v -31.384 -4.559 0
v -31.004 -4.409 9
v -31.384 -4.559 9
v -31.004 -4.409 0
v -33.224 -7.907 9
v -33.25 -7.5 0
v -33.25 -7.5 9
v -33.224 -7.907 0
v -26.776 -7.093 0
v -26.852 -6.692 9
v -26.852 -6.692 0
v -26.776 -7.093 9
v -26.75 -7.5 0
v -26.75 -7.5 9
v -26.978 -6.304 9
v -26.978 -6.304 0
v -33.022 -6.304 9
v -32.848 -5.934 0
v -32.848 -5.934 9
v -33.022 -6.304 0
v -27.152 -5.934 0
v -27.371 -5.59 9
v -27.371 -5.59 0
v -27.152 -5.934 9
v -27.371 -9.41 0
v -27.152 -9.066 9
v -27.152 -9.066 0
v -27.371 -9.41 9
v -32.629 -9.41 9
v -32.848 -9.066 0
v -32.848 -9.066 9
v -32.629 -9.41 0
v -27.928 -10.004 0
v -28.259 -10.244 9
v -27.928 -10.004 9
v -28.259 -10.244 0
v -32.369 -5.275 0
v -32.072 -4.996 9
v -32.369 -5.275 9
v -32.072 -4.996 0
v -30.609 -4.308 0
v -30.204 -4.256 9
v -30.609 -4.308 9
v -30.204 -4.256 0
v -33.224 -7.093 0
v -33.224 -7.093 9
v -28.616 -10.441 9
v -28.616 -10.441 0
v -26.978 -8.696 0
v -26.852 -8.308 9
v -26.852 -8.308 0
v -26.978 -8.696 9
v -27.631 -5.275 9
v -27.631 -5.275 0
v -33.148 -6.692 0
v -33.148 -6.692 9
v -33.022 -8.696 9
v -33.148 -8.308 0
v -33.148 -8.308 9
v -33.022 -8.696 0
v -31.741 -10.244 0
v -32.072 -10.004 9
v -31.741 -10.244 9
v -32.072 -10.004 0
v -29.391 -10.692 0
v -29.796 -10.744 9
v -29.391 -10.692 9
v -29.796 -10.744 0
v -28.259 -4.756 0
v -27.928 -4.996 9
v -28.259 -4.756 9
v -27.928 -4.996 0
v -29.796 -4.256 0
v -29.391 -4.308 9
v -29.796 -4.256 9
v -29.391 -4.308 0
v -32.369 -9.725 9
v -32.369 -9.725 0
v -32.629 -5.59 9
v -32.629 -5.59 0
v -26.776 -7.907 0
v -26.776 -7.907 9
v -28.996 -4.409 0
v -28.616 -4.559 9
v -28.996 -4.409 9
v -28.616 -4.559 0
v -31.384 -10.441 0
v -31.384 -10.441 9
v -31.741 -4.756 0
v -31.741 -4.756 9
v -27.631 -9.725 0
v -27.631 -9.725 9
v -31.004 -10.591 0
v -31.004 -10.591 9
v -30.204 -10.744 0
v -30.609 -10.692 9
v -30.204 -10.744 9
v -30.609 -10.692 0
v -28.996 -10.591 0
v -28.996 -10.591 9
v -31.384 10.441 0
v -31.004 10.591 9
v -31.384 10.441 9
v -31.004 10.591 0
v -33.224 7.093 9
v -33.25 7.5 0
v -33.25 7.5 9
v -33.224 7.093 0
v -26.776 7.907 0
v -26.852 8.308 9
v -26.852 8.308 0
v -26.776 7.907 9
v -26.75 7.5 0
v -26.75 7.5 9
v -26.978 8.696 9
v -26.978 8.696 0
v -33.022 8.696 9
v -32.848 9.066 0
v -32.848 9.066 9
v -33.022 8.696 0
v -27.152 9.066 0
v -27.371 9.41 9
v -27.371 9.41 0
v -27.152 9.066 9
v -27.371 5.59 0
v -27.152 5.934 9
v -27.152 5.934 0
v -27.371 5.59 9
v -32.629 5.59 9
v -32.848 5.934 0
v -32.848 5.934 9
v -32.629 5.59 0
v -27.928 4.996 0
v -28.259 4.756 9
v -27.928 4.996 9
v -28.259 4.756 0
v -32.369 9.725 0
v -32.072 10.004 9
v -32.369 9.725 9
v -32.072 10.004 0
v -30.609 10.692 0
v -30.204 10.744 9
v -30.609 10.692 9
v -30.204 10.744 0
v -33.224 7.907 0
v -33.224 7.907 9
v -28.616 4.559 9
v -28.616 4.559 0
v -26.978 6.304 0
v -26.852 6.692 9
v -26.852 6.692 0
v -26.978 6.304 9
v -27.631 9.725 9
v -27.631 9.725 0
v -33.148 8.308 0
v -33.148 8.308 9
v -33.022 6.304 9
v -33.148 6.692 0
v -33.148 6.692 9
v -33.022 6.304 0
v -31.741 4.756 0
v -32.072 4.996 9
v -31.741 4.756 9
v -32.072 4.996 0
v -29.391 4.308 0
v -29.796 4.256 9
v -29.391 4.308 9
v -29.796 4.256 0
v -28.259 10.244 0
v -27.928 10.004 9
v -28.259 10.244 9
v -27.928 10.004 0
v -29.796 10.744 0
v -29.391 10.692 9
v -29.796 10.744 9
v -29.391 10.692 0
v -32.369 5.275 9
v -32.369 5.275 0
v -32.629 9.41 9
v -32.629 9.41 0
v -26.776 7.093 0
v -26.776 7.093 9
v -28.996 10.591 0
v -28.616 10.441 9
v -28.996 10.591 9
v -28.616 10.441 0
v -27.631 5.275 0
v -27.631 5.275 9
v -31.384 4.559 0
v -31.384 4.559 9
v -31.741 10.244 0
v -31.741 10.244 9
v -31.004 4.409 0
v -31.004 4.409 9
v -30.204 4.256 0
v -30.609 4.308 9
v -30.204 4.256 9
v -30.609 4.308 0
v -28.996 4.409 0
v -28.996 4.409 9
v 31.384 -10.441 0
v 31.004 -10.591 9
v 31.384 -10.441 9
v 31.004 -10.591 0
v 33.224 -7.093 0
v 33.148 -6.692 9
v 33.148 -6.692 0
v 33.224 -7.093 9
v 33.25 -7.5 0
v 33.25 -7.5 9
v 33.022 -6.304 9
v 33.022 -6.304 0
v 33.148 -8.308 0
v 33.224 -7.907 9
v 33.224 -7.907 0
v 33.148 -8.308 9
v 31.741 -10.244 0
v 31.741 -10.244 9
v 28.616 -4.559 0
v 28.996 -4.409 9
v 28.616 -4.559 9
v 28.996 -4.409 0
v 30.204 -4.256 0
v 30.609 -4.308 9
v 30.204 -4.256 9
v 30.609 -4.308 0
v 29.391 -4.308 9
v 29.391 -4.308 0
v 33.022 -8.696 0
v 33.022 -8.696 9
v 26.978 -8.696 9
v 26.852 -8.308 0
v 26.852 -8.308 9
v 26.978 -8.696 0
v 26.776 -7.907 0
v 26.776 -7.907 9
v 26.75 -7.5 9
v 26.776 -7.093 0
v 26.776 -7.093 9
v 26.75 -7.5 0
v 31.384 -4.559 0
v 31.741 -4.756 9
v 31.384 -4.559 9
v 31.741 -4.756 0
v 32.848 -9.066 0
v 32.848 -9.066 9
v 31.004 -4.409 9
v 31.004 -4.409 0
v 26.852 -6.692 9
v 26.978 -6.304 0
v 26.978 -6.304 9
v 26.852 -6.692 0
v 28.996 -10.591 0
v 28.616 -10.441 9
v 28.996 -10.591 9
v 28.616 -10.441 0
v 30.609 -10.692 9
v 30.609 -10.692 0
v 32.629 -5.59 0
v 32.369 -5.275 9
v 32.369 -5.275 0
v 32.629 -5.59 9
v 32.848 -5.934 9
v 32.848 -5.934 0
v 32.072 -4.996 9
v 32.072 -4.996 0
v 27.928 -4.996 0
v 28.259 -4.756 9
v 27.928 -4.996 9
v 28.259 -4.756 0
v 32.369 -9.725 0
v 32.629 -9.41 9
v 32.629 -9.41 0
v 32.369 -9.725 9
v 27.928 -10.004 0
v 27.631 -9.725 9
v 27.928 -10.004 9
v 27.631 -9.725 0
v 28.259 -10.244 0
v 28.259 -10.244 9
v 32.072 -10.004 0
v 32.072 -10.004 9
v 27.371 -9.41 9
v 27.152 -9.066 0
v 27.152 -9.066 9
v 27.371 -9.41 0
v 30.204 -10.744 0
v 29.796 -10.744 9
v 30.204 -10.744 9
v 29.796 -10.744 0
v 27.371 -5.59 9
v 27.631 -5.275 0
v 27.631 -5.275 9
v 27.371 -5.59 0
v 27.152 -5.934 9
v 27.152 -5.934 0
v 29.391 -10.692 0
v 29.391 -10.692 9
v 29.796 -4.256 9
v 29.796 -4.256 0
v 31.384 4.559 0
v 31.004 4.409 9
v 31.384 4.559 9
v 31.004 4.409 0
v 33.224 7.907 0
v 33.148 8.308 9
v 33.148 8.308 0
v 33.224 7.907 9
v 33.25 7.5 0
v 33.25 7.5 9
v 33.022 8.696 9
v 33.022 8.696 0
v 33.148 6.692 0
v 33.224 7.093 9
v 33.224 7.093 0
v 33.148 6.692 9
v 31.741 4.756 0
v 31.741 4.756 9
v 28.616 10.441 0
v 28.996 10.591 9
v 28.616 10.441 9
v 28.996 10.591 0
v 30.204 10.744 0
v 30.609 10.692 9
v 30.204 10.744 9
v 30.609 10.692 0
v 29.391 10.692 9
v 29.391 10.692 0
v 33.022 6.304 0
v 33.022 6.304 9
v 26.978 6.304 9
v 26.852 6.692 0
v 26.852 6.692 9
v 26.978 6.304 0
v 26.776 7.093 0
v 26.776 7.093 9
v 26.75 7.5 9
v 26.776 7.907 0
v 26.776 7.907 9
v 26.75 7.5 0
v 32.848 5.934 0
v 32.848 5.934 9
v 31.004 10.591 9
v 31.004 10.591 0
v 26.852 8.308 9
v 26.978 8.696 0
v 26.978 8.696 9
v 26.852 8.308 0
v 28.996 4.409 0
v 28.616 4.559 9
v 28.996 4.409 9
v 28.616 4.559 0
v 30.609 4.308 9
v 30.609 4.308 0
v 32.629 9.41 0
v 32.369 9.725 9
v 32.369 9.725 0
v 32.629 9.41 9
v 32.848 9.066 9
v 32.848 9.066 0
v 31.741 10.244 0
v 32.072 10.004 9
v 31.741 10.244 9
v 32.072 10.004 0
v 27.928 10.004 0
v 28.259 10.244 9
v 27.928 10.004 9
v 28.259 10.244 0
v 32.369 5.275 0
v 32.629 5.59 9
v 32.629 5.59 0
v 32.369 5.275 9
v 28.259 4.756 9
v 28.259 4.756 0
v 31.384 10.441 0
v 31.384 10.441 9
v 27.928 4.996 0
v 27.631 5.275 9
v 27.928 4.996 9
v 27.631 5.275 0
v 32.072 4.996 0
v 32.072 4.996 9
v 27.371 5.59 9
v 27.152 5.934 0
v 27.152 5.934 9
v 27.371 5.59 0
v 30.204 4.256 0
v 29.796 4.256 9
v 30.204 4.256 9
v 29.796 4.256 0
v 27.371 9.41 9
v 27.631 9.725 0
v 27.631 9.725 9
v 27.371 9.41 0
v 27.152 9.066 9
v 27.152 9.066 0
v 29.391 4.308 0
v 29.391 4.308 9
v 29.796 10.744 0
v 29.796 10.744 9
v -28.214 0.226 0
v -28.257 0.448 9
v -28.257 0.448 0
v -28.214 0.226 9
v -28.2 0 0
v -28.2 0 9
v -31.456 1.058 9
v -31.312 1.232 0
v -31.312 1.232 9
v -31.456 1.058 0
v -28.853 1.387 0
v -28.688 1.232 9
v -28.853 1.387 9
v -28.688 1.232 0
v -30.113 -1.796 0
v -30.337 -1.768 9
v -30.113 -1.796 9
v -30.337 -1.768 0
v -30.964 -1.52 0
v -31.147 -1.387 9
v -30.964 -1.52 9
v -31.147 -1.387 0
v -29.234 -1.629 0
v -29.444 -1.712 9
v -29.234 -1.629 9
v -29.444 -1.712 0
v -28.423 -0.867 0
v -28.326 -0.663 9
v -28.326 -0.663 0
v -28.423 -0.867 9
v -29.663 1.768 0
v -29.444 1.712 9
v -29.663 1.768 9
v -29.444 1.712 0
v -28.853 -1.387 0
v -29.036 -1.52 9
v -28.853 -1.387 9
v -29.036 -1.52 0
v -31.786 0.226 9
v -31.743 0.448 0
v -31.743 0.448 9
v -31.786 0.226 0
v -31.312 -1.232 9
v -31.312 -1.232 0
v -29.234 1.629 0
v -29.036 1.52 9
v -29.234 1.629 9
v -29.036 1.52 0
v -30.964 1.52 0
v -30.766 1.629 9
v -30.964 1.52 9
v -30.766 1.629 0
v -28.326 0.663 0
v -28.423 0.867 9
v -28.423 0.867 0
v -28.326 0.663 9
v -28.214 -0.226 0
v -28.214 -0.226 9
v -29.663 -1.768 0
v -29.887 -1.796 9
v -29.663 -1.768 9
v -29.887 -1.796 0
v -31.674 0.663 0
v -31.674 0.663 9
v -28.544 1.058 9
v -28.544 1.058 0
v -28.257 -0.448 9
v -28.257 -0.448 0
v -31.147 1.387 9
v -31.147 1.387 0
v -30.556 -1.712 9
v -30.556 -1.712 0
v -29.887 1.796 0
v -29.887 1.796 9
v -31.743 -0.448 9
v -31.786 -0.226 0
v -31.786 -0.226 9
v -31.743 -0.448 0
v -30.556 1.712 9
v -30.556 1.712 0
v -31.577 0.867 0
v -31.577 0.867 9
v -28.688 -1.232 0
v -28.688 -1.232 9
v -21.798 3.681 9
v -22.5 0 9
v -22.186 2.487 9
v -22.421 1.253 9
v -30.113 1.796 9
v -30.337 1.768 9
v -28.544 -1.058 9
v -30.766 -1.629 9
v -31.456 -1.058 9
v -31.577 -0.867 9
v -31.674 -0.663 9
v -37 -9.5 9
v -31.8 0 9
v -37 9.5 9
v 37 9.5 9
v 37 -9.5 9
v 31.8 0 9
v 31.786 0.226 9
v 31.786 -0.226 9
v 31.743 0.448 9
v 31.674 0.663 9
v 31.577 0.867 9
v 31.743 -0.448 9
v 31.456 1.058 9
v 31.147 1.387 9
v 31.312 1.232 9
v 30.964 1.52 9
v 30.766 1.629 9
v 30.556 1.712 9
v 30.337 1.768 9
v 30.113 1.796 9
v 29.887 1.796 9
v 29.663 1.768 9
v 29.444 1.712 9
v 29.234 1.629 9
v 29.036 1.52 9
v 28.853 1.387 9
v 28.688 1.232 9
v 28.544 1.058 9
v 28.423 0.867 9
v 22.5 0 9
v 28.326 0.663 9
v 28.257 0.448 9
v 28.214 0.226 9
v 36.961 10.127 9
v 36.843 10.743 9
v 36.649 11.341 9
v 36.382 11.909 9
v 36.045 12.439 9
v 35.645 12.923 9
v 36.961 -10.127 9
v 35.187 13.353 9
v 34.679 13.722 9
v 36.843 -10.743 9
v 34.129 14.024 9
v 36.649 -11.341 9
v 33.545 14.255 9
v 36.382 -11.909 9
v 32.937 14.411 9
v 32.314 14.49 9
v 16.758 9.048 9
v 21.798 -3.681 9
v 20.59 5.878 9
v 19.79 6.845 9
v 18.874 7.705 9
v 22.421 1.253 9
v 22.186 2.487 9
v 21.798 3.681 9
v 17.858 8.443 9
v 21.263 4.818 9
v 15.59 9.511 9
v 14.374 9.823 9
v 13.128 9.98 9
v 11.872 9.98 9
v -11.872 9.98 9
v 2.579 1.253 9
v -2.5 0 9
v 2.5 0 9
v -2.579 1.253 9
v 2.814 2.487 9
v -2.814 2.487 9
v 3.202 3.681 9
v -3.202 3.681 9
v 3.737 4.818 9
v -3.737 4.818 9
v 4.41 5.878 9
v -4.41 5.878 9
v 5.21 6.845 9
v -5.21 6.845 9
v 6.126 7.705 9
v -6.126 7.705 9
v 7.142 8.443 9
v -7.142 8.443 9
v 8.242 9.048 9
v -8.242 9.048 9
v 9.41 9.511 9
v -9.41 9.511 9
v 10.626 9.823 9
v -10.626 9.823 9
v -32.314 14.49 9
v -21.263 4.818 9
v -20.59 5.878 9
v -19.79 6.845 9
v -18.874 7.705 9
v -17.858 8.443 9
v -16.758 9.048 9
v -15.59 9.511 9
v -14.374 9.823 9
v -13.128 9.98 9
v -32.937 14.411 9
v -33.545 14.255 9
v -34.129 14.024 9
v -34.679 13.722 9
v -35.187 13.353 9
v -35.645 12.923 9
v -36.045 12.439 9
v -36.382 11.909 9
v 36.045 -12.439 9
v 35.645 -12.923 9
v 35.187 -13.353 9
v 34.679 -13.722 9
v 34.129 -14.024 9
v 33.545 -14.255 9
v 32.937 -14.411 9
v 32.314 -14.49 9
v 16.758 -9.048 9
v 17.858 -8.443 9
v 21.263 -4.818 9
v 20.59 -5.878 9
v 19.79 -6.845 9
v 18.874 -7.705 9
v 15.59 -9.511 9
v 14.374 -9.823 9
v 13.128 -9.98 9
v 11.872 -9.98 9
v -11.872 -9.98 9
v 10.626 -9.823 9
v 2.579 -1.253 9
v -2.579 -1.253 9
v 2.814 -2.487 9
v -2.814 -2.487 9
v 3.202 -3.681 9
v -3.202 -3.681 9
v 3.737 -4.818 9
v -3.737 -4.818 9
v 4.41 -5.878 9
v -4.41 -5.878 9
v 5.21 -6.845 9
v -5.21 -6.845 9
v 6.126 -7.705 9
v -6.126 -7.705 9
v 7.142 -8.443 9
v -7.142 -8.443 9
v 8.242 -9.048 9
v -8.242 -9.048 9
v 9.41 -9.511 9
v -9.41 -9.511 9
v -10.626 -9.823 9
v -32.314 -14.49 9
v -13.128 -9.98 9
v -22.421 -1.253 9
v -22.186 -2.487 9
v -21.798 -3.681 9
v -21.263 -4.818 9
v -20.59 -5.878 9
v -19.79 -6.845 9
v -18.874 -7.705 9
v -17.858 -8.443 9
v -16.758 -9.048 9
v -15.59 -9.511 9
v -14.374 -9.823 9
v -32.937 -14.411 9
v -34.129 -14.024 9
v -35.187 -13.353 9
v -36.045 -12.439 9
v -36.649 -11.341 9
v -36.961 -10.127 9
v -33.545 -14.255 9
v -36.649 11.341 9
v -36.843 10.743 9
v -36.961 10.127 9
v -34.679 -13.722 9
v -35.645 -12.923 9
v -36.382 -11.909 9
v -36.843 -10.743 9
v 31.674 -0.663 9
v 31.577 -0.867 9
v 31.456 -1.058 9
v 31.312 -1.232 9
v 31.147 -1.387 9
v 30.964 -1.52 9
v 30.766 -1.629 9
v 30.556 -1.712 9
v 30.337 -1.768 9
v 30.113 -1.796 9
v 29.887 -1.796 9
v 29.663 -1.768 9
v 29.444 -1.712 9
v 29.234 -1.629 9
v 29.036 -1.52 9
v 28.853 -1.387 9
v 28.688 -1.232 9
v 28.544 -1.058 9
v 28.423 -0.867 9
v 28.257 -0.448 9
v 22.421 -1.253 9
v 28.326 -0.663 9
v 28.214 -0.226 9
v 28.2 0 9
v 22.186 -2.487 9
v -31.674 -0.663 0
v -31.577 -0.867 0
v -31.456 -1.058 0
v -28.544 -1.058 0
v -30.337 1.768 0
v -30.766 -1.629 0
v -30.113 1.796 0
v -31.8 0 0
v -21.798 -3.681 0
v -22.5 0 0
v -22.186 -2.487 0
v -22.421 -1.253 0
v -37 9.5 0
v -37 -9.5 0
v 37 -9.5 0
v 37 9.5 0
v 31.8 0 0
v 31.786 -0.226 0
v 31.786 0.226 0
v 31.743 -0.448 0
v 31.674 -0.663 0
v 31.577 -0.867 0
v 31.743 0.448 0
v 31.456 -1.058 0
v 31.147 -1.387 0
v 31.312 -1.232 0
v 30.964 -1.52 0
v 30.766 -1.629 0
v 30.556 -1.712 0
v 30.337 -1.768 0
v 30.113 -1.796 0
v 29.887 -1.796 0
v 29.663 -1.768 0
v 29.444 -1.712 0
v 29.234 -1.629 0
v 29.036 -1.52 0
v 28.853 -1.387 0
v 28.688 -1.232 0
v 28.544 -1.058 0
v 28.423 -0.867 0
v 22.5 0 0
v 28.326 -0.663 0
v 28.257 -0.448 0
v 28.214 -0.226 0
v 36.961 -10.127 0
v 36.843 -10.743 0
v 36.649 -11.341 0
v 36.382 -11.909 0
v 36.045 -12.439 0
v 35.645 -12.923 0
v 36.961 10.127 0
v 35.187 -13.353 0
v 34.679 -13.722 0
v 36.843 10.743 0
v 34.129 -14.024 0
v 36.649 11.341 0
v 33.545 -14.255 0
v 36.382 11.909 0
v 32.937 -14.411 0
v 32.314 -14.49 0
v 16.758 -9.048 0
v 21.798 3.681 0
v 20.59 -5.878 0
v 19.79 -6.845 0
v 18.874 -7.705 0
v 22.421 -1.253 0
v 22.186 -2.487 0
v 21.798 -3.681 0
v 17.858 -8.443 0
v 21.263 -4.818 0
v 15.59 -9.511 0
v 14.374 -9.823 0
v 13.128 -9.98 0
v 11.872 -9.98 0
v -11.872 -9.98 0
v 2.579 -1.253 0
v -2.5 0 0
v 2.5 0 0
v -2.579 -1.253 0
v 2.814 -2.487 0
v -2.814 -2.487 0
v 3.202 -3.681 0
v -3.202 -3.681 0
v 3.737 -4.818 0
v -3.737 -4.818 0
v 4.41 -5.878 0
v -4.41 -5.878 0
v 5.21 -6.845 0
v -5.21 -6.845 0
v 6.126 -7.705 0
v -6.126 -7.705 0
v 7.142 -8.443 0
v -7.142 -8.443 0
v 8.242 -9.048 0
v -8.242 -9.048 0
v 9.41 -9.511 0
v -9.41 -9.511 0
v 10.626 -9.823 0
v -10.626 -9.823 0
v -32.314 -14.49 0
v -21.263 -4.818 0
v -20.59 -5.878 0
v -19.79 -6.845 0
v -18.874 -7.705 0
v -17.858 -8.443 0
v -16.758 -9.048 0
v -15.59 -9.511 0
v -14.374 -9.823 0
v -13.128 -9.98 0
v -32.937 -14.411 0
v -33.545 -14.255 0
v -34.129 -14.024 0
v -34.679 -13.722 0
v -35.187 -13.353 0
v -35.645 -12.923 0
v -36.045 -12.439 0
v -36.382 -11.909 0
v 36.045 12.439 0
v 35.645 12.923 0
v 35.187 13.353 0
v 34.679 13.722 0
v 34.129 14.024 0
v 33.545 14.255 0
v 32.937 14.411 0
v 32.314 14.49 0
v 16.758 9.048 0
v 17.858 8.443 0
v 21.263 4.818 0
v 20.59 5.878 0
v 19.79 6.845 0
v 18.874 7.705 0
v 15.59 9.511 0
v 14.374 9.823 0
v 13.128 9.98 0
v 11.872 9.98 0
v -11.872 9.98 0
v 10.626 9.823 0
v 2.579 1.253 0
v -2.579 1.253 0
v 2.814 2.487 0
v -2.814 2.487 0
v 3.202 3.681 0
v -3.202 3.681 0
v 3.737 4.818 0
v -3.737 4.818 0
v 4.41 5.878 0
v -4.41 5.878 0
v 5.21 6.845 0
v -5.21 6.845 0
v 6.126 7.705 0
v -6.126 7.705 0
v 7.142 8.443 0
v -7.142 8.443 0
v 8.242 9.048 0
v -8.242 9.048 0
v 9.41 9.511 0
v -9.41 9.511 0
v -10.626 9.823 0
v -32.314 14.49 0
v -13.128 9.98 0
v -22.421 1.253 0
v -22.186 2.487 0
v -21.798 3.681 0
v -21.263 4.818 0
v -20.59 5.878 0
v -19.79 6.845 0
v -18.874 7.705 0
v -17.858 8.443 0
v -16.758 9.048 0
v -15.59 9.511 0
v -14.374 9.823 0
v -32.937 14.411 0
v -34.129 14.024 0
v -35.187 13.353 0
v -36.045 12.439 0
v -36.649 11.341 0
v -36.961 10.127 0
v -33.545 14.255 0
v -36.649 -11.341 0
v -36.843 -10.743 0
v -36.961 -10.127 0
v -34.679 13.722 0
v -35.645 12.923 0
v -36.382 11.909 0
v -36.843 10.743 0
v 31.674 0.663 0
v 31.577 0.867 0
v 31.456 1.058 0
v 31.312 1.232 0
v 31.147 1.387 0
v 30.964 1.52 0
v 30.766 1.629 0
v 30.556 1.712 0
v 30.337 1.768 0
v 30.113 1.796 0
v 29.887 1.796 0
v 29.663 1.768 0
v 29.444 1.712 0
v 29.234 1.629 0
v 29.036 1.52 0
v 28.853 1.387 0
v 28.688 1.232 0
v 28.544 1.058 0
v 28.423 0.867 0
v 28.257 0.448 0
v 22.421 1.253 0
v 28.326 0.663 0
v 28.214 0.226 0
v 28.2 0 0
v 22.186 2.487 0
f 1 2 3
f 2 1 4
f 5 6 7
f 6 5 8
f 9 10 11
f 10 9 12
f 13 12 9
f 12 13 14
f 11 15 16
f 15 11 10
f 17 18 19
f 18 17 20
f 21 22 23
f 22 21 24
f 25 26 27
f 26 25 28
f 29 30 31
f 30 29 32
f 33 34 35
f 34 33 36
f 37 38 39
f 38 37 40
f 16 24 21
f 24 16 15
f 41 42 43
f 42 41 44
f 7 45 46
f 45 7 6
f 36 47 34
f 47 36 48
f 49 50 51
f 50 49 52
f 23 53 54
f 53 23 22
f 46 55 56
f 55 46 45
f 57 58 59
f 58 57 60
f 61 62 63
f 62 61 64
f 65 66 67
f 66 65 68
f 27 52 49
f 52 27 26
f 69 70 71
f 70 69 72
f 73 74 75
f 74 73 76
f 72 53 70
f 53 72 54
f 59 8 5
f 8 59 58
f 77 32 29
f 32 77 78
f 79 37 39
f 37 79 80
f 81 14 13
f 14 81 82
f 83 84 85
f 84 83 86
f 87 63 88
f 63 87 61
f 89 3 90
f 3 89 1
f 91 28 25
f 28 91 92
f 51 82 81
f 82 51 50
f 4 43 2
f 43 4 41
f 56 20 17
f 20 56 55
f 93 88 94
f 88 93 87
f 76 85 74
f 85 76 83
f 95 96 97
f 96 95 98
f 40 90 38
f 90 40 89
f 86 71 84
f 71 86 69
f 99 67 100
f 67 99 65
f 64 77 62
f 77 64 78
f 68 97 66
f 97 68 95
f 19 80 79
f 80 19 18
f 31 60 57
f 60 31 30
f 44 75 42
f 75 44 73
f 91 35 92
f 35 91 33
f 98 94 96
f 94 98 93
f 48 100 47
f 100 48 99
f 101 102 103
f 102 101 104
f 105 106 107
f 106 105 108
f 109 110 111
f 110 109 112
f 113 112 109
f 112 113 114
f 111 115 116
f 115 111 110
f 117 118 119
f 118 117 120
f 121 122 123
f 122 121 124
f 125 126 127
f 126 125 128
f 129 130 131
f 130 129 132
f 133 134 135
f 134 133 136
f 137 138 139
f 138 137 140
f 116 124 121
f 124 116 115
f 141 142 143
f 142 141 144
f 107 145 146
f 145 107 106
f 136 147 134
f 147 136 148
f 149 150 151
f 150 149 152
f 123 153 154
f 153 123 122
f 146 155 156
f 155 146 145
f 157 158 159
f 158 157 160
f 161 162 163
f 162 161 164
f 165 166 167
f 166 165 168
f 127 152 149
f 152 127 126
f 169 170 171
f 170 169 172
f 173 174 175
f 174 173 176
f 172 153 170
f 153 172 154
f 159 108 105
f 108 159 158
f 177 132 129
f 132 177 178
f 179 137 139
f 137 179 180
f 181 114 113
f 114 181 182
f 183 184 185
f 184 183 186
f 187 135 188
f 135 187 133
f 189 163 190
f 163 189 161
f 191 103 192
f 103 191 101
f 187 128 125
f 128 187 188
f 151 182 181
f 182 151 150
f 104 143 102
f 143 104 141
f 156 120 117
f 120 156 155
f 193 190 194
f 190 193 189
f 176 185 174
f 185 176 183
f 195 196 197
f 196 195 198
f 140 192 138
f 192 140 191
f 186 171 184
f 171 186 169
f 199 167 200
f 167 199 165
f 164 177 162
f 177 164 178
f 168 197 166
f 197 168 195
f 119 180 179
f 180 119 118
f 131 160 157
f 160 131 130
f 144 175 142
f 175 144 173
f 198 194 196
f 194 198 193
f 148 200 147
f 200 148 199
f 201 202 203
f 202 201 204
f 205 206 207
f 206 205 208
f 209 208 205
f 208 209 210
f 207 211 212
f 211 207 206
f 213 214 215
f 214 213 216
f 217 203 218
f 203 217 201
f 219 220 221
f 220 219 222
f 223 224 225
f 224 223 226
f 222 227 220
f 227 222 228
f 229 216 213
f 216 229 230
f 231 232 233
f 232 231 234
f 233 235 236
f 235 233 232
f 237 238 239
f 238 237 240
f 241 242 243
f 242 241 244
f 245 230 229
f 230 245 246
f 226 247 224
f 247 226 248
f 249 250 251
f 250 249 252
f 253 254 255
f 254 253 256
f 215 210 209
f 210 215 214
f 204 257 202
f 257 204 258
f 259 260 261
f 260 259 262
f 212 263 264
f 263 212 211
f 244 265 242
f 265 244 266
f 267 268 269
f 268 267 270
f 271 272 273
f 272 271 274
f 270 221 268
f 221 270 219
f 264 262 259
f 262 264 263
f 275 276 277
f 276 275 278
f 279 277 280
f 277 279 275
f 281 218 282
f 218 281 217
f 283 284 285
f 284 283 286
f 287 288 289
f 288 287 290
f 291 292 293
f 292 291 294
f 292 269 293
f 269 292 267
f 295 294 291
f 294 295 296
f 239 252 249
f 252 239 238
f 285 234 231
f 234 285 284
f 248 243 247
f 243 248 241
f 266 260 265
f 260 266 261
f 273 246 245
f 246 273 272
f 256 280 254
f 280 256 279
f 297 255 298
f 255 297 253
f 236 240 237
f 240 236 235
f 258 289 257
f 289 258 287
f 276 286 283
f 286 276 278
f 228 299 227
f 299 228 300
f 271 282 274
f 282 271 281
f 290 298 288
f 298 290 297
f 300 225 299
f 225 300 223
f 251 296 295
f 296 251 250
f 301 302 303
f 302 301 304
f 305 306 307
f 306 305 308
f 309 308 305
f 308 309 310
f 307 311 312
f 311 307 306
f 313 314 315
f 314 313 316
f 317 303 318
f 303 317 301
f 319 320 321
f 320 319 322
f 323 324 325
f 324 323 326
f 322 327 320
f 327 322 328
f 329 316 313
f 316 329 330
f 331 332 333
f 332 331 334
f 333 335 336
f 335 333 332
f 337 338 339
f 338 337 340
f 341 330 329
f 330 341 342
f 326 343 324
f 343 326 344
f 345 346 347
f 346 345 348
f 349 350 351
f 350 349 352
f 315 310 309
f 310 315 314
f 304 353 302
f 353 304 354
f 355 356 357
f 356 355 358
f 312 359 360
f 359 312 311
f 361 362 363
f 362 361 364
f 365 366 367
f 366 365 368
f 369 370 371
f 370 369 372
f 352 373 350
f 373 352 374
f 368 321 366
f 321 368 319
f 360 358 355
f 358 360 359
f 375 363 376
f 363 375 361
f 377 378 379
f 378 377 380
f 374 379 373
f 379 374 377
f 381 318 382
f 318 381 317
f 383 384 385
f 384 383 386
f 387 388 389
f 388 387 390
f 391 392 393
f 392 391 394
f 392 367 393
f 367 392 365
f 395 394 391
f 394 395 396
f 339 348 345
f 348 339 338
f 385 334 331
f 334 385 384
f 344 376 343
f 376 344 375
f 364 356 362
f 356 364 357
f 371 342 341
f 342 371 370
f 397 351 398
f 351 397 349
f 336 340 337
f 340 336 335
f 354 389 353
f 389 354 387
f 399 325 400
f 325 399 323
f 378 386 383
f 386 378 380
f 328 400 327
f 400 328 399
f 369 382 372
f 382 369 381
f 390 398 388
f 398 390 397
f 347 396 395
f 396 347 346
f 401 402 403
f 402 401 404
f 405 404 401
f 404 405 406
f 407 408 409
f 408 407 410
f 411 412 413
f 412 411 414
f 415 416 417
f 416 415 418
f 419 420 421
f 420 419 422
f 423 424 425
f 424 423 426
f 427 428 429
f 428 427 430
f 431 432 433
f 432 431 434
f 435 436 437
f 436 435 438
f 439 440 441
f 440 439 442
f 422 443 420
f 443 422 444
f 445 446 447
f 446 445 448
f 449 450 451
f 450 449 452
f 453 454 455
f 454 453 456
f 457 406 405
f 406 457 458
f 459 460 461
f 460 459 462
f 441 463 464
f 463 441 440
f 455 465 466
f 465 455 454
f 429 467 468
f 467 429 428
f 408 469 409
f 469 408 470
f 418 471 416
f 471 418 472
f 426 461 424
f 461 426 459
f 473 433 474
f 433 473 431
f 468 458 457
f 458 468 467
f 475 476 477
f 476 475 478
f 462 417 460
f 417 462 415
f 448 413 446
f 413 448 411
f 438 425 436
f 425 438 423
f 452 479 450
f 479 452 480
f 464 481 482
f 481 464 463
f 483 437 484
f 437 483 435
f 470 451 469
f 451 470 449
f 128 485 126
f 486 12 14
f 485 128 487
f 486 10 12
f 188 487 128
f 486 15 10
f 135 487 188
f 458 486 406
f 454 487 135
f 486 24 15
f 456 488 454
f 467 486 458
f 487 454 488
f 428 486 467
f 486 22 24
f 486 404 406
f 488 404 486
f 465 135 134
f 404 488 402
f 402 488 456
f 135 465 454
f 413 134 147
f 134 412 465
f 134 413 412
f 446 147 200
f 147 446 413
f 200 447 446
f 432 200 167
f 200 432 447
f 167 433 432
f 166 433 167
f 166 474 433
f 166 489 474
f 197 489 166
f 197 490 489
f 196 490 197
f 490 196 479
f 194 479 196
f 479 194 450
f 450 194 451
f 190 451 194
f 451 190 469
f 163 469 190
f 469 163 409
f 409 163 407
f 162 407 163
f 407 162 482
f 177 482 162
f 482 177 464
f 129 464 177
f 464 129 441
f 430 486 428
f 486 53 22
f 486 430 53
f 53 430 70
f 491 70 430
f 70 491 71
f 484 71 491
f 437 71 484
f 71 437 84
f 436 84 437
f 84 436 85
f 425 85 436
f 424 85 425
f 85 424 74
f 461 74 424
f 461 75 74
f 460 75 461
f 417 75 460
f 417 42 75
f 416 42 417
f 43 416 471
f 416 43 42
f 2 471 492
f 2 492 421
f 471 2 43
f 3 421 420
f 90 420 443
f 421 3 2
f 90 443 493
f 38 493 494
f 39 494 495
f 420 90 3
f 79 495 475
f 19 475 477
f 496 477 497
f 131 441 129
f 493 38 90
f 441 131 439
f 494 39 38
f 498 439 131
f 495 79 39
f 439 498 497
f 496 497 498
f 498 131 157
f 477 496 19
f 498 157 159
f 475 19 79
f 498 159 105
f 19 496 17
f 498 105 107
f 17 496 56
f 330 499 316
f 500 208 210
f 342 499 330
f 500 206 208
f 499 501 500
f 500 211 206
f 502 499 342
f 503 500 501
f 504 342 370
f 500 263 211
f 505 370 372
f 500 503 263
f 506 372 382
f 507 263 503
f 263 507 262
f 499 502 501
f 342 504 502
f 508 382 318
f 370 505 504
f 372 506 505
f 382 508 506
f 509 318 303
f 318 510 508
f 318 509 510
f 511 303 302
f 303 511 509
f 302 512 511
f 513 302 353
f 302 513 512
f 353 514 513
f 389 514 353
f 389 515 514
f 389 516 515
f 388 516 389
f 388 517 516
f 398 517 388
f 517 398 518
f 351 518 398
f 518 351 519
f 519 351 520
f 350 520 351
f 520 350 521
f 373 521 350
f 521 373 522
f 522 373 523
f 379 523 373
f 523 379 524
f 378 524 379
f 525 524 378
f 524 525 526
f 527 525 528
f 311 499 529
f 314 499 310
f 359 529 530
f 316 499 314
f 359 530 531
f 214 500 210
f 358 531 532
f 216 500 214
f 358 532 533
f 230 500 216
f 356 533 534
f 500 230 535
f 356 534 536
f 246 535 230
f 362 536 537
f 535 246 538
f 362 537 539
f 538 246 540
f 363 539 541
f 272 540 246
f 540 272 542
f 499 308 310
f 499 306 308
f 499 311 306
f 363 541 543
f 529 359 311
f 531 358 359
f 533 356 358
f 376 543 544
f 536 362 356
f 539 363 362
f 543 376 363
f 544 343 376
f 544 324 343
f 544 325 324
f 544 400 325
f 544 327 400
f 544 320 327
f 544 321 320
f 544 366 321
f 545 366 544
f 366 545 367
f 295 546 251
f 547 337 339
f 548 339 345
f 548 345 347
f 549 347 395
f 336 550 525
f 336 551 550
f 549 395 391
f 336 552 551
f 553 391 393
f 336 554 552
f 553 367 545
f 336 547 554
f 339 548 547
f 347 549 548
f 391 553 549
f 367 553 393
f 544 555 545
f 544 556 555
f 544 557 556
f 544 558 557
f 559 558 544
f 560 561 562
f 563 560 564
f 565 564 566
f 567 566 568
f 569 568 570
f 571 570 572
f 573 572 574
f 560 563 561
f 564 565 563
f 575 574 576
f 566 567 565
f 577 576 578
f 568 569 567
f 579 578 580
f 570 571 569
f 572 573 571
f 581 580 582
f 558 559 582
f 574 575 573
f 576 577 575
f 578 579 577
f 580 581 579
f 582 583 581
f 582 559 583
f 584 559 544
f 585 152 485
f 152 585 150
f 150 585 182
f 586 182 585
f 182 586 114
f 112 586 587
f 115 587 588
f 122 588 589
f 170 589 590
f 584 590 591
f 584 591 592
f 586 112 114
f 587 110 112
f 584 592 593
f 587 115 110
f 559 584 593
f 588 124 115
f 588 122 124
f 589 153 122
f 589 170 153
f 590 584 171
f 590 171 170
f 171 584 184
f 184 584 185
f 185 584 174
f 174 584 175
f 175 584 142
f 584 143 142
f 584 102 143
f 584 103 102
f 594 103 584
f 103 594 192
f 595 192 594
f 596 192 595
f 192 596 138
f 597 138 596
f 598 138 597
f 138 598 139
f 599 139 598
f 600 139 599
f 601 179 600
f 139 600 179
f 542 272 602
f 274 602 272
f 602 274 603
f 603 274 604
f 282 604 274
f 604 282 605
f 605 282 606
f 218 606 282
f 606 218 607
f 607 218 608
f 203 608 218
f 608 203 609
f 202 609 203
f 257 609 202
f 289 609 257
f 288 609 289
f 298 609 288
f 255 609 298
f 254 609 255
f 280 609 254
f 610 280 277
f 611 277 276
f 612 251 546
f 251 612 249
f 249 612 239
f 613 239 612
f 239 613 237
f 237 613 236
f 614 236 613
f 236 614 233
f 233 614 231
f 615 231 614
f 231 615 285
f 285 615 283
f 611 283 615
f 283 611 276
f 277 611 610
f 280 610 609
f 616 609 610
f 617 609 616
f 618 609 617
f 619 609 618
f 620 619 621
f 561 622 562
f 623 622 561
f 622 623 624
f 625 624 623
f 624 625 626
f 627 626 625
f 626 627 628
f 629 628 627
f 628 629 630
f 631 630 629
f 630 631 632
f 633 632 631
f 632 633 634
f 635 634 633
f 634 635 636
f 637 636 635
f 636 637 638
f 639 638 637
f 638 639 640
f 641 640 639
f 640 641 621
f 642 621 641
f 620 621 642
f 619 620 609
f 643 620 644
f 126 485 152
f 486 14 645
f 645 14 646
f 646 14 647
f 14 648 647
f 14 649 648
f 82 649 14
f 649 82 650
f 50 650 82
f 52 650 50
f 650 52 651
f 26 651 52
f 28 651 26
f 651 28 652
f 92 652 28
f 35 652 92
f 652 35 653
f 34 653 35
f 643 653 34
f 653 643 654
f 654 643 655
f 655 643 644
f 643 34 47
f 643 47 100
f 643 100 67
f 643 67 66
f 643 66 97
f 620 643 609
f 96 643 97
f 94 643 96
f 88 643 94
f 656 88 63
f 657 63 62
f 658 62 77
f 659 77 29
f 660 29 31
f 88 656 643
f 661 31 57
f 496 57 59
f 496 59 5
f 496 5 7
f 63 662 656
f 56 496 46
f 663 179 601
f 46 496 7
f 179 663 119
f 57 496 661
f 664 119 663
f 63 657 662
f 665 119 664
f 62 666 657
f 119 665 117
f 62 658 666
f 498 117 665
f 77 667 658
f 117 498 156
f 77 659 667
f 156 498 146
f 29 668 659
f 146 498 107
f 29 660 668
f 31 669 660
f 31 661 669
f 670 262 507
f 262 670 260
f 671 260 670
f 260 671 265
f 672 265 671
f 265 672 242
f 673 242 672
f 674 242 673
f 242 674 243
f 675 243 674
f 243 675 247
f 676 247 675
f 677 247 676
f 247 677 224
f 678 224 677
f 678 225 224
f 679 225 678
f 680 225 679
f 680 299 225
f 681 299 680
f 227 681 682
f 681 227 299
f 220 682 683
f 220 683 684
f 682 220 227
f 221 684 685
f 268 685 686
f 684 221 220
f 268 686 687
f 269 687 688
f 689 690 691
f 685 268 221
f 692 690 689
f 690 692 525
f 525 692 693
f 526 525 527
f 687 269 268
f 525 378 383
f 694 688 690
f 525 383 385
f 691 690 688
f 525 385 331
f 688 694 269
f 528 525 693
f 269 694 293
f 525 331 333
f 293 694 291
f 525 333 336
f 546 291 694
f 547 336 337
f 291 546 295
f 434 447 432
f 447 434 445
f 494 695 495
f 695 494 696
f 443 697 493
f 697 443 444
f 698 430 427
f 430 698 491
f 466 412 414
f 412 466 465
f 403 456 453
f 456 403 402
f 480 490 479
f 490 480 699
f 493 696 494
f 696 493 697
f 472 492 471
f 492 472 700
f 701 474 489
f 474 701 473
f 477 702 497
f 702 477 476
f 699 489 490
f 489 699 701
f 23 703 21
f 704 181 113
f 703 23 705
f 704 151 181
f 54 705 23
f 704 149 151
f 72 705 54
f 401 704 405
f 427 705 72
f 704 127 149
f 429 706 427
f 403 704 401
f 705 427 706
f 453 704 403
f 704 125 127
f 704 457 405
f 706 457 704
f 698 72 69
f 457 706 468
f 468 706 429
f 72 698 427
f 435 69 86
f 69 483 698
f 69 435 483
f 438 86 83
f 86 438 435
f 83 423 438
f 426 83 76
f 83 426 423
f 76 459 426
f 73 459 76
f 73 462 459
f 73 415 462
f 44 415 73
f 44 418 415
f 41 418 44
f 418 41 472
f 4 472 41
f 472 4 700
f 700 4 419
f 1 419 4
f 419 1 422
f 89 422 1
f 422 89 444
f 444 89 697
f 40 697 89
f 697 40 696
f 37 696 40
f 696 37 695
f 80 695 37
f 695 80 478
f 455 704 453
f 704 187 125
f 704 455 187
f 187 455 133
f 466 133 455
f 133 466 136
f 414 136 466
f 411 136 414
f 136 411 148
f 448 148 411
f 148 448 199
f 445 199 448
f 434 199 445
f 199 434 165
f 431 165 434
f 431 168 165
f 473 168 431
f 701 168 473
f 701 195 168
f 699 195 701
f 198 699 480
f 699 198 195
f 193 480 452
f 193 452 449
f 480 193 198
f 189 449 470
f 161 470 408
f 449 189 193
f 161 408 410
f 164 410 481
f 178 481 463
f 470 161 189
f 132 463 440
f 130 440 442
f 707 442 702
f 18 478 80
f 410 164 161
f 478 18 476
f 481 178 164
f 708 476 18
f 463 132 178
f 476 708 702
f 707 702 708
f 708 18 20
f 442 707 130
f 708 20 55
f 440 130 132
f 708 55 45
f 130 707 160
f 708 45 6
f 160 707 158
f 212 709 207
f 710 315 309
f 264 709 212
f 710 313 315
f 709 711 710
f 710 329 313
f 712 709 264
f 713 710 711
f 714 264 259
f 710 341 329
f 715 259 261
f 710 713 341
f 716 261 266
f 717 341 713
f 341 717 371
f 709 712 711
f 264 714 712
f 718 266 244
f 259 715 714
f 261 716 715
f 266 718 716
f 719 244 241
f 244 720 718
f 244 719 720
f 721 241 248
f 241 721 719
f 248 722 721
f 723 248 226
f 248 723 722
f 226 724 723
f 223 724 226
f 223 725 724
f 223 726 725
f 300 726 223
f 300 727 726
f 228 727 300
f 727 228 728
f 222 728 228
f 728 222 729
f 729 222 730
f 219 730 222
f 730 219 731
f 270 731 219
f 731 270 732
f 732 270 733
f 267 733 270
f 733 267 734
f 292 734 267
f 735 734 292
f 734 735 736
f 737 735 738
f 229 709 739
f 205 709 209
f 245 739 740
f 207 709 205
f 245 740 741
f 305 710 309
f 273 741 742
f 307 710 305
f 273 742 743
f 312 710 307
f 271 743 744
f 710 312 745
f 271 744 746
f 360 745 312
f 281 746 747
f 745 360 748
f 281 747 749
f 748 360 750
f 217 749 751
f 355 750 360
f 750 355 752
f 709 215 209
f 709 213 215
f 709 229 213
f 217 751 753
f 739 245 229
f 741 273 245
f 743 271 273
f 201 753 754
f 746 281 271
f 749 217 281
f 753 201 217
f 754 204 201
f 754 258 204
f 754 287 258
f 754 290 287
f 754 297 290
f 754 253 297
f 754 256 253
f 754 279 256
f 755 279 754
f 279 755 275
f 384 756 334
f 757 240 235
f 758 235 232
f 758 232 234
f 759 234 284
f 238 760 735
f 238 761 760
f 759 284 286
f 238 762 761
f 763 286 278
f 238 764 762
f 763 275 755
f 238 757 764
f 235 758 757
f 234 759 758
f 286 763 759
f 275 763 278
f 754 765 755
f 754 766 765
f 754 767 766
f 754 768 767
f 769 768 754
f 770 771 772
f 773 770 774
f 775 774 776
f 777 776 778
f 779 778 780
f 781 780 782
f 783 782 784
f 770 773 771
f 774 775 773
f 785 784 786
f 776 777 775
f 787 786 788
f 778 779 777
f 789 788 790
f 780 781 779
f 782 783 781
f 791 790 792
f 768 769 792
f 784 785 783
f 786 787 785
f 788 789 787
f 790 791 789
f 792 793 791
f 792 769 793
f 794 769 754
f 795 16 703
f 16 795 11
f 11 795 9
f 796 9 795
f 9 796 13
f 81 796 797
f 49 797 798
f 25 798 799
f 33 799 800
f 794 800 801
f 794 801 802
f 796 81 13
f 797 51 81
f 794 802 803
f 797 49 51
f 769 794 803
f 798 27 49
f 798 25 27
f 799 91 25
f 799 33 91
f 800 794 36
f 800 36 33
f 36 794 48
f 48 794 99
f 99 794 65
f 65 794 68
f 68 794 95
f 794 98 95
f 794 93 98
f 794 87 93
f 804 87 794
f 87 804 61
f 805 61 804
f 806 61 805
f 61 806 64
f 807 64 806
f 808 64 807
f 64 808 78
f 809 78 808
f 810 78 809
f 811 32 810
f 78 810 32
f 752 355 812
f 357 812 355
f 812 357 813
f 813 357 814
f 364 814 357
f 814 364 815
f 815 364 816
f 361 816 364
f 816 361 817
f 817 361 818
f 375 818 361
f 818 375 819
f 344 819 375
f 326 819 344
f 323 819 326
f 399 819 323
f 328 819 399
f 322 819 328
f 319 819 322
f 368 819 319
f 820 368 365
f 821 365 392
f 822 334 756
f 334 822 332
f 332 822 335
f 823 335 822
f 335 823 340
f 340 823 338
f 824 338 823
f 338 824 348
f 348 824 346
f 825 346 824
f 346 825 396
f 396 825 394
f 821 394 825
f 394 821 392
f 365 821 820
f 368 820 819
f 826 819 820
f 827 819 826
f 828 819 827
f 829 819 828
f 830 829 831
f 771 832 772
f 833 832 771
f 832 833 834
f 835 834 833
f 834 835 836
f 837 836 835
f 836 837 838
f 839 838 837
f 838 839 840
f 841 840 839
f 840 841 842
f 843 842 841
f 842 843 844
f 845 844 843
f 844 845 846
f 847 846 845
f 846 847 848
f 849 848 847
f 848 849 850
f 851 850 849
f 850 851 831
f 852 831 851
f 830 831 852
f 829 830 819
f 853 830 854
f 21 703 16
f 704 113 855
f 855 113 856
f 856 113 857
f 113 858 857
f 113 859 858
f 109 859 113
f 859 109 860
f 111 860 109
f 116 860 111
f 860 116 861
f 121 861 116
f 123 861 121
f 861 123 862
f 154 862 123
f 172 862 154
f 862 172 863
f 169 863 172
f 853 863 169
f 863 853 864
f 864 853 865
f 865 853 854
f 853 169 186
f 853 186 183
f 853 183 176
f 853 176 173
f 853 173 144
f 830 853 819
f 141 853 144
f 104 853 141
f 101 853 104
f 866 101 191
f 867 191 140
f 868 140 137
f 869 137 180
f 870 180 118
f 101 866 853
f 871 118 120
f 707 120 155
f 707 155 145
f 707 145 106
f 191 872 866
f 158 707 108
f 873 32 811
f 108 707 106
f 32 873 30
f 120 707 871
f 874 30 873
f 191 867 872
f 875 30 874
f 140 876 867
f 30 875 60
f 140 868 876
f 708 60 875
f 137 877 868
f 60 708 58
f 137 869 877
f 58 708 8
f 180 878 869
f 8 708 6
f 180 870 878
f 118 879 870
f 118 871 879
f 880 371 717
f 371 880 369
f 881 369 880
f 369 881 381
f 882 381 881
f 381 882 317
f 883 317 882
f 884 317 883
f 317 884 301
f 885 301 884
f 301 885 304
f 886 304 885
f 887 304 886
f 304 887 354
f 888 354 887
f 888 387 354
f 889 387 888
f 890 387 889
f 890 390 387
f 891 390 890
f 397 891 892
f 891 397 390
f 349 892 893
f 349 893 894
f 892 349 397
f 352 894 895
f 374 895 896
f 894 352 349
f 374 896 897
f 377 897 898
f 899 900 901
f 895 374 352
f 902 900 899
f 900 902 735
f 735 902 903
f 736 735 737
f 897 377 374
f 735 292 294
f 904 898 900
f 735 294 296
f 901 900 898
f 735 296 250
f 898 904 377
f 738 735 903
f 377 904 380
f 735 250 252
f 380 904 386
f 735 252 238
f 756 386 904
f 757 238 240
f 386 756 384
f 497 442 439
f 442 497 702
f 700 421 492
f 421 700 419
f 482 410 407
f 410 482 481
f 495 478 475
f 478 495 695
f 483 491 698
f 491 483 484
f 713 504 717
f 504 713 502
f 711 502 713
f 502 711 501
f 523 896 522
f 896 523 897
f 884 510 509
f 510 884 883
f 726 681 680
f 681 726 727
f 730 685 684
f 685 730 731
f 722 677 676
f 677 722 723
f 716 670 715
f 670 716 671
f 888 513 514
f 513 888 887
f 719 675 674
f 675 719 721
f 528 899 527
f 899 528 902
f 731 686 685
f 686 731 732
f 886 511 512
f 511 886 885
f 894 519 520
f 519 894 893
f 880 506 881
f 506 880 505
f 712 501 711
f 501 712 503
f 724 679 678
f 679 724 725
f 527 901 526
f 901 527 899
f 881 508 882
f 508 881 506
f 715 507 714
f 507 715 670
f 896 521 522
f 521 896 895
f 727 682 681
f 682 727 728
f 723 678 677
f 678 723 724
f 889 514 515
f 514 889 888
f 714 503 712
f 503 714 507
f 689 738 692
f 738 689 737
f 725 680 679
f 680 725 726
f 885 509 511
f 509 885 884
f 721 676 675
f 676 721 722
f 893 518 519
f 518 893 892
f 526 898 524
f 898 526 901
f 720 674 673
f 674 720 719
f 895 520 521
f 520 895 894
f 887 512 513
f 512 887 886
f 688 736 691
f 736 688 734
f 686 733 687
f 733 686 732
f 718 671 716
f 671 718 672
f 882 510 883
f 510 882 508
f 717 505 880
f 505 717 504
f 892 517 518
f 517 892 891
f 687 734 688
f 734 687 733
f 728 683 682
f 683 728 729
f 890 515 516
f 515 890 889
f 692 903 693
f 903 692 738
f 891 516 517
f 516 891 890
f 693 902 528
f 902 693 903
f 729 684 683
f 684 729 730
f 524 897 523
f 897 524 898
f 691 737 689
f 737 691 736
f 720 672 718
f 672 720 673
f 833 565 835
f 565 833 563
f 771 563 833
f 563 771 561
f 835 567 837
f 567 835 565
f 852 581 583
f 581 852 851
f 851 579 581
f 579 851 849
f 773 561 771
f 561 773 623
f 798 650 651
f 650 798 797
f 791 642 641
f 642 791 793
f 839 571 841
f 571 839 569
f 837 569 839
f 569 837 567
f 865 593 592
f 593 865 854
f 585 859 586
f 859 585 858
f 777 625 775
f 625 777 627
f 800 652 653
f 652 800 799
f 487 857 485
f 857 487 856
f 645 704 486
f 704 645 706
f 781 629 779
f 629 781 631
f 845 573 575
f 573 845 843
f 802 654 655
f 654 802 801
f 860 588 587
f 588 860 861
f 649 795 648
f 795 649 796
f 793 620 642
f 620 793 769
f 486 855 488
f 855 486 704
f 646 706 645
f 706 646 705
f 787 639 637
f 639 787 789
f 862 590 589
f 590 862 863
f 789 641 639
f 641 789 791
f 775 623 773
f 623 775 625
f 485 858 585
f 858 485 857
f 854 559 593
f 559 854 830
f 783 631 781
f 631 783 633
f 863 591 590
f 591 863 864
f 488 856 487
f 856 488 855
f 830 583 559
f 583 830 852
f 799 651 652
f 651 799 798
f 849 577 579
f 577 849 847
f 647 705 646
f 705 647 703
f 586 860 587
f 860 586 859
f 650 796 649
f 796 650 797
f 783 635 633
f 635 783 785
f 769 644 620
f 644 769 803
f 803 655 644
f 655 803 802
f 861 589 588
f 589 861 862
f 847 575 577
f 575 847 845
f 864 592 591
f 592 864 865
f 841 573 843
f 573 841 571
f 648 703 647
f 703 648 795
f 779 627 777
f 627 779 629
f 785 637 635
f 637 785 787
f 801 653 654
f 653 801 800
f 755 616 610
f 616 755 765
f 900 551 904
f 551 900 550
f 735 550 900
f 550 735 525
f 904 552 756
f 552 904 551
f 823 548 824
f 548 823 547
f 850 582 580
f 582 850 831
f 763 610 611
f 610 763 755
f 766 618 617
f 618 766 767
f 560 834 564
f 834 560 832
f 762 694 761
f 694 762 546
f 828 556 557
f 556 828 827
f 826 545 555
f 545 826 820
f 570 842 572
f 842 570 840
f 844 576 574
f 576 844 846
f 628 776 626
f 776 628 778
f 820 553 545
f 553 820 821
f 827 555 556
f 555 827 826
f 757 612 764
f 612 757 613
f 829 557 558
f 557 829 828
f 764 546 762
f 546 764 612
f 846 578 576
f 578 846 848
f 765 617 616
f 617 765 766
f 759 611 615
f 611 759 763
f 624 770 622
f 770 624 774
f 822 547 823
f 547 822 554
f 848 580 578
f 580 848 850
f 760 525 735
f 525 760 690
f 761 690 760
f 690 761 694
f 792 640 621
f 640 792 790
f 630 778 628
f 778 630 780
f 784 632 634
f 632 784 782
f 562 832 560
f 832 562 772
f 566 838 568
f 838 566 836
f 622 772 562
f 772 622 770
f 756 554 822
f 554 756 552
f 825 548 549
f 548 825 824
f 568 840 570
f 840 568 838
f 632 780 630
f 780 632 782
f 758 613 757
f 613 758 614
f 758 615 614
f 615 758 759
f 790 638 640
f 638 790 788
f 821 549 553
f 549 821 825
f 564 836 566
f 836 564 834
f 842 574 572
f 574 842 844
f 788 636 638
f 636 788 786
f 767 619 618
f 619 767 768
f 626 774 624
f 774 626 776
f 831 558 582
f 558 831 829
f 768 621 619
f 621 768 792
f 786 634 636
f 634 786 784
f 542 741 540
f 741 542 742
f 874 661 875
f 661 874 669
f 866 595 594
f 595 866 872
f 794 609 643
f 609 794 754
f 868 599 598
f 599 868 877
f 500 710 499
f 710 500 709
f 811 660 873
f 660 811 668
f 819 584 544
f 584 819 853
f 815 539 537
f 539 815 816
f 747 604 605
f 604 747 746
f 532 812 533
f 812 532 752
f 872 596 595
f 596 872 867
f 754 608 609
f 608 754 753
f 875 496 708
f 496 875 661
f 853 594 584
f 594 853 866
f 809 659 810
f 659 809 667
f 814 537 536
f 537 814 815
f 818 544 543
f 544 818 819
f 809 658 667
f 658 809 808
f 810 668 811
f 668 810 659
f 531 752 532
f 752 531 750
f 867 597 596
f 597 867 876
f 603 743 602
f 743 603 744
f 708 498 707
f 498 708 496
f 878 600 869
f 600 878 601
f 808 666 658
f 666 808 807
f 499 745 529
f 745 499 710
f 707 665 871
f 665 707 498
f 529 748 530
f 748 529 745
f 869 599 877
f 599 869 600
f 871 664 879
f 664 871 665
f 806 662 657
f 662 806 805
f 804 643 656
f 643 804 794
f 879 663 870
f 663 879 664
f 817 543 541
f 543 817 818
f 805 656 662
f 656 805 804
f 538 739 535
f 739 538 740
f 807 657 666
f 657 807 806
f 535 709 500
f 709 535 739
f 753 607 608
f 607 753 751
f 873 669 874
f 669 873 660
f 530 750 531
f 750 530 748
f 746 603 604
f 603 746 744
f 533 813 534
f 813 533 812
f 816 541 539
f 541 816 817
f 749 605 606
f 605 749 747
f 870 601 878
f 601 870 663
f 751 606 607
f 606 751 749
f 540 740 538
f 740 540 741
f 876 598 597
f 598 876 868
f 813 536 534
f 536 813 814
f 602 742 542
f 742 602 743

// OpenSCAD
$fn = 50;


difference() {
	union() {
		hull() {
			translate(v = [-32.0000000000, 9.5000000000, 0]) {
				cylinder(h = 9, r = 5);
			}
			translate(v = [32.0000000000, 9.5000000000, 0]) {
				cylinder(h = 9, r = 5);
			}
			translate(v = [-32.0000000000, -9.5000000000, 0]) {
				cylinder(h = 9, r = 5);
			}
			translate(v = [32.0000000000, -9.5000000000, 0]) {
				cylinder(h = 9, r = 5);
			}
		}
	}
	union() {
		#translate(v = [-30.0000000000, -7.5000000000, 0]) {
			cylinder(h = 9, r = 3.2500000000);
		}
		#translate(v = [-30.0000000000, 7.5000000000, 0]) {
			cylinder(h = 9, r = 3.2500000000);
		}
		#translate(v = [30.0000000000, -7.5000000000, 0]) {
			cylinder(h = 9, r = 3.2500000000);
		}
		#translate(v = [30.0000000000, 7.5000000000, 0]) {
			cylinder(h = 9, r = 3.2500000000);
		}
		#translate(v = [-30.0000000000, -7.5000000000, -100.0000000000]) {
			cylinder(h = 200, r = 3.2500000000);
		}
		#translate(v = [-30.0000000000, 7.5000000000, -100.0000000000]) {
			cylinder(h = 200, r = 3.2500000000);
		}
		#translate(v = [30.0000000000, -7.5000000000, -100.0000000000]) {
			cylinder(h = 200, r = 3.2500000000);
		}
		#translate(v = [30.0000000000, 7.5000000000, -100.0000000000]) {
			cylinder(h = 200, r = 3.2500000000);
		}
		#translate(v = [-30.0000000000, -7.5000000000, 0]) {
			cylinder(h = 9, r = 1.8000000000);
		}
		#translate(v = [-30.0000000000, 0.0000000000, 0]) {
			cylinder(h = 9, r = 1.8000000000);
		}
		#translate(v = [-30.0000000000, 7.5000000000, 0]) {
			cylinder(h = 9, r = 1.8000000000);
		}
		#translate(v = [30.0000000000, -7.5000000000, 0]) {
			cylinder(h = 9, r = 1.8000000000);
		}
		#translate(v = [30.0000000000, 0.0000000000, 0]) {
			cylinder(h = 9, r = 1.8000000000);
		}
		#translate(v = [30.0000000000, 7.5000000000, 0]) {
			cylinder(h = 9, r = 1.8000000000);
		}
		#translate(v = [-30.0000000000, -7.5000000000, 0]) {
			cylinder(h = 9, r = 1.8000000000);
		}
		#translate(v = [-30.0000000000, 0.0000000000, 0]) {
			cylinder(h = 9, r = 1.8000000000);
		}
		#translate(v = [-30.0000000000, 7.5000000000, 0]) {
			cylinder(h = 9, r = 1.8000000000);
		}
		#translate(v = [30.0000000000, -7.5000000000, 0]) {
			cylinder(h = 9, r = 1.8000000000);
		}
		#translate(v = [30.0000000000, 0.0000000000, 0]) {
			cylinder(h = 9, r = 1.8000000000);
		}
		#translate(v = [30.0000000000, 7.5000000000, 0]) {
			cylinder(h = 9, r = 1.8000000000);
		}
		#translate(v = [-30.0000000000, -7.5000000000, 0]) {
			cylinder(h = 9, r = 1.8000000000);
		}
		#translate(v = [-30.0000000000, 0.0000000000, 0]) {
			cylinder(h = 9, r = 1.8000000000);
		}
		#translate(v = [-30.0000000000, 7.5000000000, 0]) {
			cylinder(h = 9, r = 1.8000000000);
		}
		#translate(v = [30.0000000000, -7.5000000000, 0]) {
			cylinder(h = 9, r = 1.8000000000);
		}
		#translate(v = [30.0000000000, 0.0000000000, 0]) {
			cylinder(h = 9, r = 1.8000000000);
		}
		#translate(v = [30.0000000000, 7.5000000000, 0]) {
			cylinder(h = 9, r = 1.8000000000);
		}
		#translate(v = [-12.5000000000, 0, 0]) {
			cylinder(h = 9, r = 10.0000000000);
		}
		#translate(v = [12.5000000000, 0, 0]) {
			cylinder(h = 9, r = 10.0000000000);
		}
	}
}
